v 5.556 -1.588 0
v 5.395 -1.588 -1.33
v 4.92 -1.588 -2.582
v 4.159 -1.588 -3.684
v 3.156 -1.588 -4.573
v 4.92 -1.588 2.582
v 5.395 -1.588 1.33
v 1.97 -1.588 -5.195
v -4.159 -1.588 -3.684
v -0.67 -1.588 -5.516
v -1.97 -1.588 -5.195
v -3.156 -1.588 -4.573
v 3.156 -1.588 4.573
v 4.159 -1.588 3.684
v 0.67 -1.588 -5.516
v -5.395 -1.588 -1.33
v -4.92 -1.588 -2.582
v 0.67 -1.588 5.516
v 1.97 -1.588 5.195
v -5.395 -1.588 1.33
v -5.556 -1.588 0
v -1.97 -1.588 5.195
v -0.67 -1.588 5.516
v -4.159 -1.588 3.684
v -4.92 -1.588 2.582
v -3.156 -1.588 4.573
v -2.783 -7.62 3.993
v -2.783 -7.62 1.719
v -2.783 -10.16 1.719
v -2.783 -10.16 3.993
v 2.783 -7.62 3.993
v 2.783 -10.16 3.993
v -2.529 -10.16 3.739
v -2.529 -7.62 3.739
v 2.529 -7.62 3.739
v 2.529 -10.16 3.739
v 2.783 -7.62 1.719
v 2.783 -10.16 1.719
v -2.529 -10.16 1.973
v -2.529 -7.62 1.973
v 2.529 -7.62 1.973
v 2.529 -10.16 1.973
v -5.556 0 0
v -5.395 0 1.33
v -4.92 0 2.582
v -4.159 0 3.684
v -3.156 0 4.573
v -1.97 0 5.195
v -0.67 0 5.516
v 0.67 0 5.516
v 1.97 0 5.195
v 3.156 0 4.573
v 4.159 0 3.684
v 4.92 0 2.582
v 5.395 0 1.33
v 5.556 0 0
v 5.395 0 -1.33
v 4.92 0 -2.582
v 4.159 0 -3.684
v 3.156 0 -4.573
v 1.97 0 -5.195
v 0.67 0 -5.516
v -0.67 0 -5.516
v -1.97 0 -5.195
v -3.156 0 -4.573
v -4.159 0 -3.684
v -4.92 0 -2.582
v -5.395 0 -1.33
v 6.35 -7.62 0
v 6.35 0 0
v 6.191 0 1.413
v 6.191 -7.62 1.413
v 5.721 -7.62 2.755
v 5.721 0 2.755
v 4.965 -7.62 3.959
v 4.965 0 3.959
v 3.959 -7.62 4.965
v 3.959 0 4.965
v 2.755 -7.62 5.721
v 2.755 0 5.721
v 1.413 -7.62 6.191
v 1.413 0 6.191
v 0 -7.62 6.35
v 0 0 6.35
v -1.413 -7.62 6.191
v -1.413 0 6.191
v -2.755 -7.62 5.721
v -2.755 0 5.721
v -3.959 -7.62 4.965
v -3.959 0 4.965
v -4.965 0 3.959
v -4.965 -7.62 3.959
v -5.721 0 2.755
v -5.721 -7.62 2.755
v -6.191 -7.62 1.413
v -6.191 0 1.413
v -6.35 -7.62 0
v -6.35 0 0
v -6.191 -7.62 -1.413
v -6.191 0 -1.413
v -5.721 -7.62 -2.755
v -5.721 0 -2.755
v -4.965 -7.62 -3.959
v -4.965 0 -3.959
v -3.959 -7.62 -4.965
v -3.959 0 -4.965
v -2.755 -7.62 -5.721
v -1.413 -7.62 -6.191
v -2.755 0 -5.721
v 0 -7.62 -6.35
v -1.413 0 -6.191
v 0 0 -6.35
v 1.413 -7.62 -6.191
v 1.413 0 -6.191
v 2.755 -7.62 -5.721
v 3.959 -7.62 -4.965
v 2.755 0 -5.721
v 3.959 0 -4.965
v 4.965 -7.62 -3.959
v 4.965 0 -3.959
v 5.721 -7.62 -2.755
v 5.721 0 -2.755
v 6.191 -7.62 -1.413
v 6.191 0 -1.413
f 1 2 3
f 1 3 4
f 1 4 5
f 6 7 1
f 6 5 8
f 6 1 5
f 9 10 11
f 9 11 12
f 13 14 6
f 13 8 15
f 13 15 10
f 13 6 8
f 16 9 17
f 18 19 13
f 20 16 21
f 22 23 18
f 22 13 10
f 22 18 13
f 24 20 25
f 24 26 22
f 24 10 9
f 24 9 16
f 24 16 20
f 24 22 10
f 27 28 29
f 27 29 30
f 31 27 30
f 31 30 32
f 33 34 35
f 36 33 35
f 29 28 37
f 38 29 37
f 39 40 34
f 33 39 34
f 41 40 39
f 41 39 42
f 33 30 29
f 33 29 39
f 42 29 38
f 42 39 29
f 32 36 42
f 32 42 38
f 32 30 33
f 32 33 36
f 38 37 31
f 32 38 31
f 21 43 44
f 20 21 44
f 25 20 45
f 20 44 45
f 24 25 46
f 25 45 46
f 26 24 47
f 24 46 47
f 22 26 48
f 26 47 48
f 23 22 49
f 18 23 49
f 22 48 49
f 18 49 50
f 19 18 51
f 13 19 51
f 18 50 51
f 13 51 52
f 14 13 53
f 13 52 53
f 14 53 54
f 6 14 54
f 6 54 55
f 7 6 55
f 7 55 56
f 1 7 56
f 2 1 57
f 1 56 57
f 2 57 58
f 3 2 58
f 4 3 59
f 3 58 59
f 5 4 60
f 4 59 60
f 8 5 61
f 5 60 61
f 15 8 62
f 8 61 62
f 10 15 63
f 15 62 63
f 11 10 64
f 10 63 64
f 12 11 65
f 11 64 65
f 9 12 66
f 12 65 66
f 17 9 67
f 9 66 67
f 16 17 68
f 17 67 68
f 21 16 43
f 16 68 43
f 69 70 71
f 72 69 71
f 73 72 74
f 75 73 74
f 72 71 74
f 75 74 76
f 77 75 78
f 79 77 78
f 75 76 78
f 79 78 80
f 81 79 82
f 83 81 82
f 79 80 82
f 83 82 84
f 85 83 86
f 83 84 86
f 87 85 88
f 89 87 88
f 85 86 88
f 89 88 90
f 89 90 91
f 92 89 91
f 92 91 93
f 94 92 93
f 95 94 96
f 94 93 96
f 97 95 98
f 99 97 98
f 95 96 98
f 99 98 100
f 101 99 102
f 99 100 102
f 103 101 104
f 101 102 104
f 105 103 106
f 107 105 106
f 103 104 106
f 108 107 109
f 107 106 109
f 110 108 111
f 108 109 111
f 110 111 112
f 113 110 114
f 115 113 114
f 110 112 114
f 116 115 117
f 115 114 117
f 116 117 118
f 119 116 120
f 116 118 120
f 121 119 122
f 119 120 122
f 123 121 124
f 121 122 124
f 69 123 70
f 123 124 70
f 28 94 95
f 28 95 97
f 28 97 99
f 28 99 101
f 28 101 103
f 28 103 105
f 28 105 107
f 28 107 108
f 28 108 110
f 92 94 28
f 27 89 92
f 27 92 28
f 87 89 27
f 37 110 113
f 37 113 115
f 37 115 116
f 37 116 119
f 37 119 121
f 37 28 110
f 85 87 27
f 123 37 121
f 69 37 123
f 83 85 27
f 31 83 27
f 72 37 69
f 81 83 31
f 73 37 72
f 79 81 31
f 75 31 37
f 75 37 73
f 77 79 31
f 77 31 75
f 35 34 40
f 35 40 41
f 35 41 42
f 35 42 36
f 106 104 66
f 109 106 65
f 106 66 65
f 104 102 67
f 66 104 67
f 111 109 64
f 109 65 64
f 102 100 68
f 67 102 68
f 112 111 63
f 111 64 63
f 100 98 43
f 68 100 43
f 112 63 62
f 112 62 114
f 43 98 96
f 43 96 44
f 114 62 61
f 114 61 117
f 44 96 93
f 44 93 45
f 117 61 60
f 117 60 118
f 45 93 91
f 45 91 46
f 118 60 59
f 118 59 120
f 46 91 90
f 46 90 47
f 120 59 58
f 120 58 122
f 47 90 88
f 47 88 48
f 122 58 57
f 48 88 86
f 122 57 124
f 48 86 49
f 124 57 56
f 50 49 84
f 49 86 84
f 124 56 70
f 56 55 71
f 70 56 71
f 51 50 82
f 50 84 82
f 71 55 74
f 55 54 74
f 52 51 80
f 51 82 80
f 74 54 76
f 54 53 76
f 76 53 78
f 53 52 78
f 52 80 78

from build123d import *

# Parameters (mm, degrees)
F0_R     = 6.35
F1_DEPTH = 7.62
F2_R     = 5.55625
F3_DEPTH = 1.5875
F4_W     = 5.565012
F4_H     = 2.274479
F4_W_2   = 5.057012
F4_H_2   = 1.766479
F5_DEPTH = 2.54


with BuildPart() as f1:
    # F0 (on Front) → F1 (new body)
    with BuildSketch(Plane.XZ):
        Circle(F0_R)
    extrude(amount=F1_DEPTH)

    # F2 (on face) → F3 (cut)
    with BuildSketch(Plane(origin=(0, 0, 0), x_dir=(-1, 0, 0), z_dir=(0, 1, 0))):
        Circle(F2_R)
    extrude(amount=-F3_DEPTH, mode=Mode.SUBTRACT)

    # F4 (on face) → F5 (join)
    with BuildSketch(Plane.XZ.offset(7.62)):
        with Locations((0, 2.855948)):
            Rectangle(F4_W, F4_H)
        with Locations((0, 2.855948)):
            Rectangle(F4_W_2, F4_H_2, mode=Mode.SUBTRACT)
    extrude(amount=F5_DEPTH)


solid = f1.part
